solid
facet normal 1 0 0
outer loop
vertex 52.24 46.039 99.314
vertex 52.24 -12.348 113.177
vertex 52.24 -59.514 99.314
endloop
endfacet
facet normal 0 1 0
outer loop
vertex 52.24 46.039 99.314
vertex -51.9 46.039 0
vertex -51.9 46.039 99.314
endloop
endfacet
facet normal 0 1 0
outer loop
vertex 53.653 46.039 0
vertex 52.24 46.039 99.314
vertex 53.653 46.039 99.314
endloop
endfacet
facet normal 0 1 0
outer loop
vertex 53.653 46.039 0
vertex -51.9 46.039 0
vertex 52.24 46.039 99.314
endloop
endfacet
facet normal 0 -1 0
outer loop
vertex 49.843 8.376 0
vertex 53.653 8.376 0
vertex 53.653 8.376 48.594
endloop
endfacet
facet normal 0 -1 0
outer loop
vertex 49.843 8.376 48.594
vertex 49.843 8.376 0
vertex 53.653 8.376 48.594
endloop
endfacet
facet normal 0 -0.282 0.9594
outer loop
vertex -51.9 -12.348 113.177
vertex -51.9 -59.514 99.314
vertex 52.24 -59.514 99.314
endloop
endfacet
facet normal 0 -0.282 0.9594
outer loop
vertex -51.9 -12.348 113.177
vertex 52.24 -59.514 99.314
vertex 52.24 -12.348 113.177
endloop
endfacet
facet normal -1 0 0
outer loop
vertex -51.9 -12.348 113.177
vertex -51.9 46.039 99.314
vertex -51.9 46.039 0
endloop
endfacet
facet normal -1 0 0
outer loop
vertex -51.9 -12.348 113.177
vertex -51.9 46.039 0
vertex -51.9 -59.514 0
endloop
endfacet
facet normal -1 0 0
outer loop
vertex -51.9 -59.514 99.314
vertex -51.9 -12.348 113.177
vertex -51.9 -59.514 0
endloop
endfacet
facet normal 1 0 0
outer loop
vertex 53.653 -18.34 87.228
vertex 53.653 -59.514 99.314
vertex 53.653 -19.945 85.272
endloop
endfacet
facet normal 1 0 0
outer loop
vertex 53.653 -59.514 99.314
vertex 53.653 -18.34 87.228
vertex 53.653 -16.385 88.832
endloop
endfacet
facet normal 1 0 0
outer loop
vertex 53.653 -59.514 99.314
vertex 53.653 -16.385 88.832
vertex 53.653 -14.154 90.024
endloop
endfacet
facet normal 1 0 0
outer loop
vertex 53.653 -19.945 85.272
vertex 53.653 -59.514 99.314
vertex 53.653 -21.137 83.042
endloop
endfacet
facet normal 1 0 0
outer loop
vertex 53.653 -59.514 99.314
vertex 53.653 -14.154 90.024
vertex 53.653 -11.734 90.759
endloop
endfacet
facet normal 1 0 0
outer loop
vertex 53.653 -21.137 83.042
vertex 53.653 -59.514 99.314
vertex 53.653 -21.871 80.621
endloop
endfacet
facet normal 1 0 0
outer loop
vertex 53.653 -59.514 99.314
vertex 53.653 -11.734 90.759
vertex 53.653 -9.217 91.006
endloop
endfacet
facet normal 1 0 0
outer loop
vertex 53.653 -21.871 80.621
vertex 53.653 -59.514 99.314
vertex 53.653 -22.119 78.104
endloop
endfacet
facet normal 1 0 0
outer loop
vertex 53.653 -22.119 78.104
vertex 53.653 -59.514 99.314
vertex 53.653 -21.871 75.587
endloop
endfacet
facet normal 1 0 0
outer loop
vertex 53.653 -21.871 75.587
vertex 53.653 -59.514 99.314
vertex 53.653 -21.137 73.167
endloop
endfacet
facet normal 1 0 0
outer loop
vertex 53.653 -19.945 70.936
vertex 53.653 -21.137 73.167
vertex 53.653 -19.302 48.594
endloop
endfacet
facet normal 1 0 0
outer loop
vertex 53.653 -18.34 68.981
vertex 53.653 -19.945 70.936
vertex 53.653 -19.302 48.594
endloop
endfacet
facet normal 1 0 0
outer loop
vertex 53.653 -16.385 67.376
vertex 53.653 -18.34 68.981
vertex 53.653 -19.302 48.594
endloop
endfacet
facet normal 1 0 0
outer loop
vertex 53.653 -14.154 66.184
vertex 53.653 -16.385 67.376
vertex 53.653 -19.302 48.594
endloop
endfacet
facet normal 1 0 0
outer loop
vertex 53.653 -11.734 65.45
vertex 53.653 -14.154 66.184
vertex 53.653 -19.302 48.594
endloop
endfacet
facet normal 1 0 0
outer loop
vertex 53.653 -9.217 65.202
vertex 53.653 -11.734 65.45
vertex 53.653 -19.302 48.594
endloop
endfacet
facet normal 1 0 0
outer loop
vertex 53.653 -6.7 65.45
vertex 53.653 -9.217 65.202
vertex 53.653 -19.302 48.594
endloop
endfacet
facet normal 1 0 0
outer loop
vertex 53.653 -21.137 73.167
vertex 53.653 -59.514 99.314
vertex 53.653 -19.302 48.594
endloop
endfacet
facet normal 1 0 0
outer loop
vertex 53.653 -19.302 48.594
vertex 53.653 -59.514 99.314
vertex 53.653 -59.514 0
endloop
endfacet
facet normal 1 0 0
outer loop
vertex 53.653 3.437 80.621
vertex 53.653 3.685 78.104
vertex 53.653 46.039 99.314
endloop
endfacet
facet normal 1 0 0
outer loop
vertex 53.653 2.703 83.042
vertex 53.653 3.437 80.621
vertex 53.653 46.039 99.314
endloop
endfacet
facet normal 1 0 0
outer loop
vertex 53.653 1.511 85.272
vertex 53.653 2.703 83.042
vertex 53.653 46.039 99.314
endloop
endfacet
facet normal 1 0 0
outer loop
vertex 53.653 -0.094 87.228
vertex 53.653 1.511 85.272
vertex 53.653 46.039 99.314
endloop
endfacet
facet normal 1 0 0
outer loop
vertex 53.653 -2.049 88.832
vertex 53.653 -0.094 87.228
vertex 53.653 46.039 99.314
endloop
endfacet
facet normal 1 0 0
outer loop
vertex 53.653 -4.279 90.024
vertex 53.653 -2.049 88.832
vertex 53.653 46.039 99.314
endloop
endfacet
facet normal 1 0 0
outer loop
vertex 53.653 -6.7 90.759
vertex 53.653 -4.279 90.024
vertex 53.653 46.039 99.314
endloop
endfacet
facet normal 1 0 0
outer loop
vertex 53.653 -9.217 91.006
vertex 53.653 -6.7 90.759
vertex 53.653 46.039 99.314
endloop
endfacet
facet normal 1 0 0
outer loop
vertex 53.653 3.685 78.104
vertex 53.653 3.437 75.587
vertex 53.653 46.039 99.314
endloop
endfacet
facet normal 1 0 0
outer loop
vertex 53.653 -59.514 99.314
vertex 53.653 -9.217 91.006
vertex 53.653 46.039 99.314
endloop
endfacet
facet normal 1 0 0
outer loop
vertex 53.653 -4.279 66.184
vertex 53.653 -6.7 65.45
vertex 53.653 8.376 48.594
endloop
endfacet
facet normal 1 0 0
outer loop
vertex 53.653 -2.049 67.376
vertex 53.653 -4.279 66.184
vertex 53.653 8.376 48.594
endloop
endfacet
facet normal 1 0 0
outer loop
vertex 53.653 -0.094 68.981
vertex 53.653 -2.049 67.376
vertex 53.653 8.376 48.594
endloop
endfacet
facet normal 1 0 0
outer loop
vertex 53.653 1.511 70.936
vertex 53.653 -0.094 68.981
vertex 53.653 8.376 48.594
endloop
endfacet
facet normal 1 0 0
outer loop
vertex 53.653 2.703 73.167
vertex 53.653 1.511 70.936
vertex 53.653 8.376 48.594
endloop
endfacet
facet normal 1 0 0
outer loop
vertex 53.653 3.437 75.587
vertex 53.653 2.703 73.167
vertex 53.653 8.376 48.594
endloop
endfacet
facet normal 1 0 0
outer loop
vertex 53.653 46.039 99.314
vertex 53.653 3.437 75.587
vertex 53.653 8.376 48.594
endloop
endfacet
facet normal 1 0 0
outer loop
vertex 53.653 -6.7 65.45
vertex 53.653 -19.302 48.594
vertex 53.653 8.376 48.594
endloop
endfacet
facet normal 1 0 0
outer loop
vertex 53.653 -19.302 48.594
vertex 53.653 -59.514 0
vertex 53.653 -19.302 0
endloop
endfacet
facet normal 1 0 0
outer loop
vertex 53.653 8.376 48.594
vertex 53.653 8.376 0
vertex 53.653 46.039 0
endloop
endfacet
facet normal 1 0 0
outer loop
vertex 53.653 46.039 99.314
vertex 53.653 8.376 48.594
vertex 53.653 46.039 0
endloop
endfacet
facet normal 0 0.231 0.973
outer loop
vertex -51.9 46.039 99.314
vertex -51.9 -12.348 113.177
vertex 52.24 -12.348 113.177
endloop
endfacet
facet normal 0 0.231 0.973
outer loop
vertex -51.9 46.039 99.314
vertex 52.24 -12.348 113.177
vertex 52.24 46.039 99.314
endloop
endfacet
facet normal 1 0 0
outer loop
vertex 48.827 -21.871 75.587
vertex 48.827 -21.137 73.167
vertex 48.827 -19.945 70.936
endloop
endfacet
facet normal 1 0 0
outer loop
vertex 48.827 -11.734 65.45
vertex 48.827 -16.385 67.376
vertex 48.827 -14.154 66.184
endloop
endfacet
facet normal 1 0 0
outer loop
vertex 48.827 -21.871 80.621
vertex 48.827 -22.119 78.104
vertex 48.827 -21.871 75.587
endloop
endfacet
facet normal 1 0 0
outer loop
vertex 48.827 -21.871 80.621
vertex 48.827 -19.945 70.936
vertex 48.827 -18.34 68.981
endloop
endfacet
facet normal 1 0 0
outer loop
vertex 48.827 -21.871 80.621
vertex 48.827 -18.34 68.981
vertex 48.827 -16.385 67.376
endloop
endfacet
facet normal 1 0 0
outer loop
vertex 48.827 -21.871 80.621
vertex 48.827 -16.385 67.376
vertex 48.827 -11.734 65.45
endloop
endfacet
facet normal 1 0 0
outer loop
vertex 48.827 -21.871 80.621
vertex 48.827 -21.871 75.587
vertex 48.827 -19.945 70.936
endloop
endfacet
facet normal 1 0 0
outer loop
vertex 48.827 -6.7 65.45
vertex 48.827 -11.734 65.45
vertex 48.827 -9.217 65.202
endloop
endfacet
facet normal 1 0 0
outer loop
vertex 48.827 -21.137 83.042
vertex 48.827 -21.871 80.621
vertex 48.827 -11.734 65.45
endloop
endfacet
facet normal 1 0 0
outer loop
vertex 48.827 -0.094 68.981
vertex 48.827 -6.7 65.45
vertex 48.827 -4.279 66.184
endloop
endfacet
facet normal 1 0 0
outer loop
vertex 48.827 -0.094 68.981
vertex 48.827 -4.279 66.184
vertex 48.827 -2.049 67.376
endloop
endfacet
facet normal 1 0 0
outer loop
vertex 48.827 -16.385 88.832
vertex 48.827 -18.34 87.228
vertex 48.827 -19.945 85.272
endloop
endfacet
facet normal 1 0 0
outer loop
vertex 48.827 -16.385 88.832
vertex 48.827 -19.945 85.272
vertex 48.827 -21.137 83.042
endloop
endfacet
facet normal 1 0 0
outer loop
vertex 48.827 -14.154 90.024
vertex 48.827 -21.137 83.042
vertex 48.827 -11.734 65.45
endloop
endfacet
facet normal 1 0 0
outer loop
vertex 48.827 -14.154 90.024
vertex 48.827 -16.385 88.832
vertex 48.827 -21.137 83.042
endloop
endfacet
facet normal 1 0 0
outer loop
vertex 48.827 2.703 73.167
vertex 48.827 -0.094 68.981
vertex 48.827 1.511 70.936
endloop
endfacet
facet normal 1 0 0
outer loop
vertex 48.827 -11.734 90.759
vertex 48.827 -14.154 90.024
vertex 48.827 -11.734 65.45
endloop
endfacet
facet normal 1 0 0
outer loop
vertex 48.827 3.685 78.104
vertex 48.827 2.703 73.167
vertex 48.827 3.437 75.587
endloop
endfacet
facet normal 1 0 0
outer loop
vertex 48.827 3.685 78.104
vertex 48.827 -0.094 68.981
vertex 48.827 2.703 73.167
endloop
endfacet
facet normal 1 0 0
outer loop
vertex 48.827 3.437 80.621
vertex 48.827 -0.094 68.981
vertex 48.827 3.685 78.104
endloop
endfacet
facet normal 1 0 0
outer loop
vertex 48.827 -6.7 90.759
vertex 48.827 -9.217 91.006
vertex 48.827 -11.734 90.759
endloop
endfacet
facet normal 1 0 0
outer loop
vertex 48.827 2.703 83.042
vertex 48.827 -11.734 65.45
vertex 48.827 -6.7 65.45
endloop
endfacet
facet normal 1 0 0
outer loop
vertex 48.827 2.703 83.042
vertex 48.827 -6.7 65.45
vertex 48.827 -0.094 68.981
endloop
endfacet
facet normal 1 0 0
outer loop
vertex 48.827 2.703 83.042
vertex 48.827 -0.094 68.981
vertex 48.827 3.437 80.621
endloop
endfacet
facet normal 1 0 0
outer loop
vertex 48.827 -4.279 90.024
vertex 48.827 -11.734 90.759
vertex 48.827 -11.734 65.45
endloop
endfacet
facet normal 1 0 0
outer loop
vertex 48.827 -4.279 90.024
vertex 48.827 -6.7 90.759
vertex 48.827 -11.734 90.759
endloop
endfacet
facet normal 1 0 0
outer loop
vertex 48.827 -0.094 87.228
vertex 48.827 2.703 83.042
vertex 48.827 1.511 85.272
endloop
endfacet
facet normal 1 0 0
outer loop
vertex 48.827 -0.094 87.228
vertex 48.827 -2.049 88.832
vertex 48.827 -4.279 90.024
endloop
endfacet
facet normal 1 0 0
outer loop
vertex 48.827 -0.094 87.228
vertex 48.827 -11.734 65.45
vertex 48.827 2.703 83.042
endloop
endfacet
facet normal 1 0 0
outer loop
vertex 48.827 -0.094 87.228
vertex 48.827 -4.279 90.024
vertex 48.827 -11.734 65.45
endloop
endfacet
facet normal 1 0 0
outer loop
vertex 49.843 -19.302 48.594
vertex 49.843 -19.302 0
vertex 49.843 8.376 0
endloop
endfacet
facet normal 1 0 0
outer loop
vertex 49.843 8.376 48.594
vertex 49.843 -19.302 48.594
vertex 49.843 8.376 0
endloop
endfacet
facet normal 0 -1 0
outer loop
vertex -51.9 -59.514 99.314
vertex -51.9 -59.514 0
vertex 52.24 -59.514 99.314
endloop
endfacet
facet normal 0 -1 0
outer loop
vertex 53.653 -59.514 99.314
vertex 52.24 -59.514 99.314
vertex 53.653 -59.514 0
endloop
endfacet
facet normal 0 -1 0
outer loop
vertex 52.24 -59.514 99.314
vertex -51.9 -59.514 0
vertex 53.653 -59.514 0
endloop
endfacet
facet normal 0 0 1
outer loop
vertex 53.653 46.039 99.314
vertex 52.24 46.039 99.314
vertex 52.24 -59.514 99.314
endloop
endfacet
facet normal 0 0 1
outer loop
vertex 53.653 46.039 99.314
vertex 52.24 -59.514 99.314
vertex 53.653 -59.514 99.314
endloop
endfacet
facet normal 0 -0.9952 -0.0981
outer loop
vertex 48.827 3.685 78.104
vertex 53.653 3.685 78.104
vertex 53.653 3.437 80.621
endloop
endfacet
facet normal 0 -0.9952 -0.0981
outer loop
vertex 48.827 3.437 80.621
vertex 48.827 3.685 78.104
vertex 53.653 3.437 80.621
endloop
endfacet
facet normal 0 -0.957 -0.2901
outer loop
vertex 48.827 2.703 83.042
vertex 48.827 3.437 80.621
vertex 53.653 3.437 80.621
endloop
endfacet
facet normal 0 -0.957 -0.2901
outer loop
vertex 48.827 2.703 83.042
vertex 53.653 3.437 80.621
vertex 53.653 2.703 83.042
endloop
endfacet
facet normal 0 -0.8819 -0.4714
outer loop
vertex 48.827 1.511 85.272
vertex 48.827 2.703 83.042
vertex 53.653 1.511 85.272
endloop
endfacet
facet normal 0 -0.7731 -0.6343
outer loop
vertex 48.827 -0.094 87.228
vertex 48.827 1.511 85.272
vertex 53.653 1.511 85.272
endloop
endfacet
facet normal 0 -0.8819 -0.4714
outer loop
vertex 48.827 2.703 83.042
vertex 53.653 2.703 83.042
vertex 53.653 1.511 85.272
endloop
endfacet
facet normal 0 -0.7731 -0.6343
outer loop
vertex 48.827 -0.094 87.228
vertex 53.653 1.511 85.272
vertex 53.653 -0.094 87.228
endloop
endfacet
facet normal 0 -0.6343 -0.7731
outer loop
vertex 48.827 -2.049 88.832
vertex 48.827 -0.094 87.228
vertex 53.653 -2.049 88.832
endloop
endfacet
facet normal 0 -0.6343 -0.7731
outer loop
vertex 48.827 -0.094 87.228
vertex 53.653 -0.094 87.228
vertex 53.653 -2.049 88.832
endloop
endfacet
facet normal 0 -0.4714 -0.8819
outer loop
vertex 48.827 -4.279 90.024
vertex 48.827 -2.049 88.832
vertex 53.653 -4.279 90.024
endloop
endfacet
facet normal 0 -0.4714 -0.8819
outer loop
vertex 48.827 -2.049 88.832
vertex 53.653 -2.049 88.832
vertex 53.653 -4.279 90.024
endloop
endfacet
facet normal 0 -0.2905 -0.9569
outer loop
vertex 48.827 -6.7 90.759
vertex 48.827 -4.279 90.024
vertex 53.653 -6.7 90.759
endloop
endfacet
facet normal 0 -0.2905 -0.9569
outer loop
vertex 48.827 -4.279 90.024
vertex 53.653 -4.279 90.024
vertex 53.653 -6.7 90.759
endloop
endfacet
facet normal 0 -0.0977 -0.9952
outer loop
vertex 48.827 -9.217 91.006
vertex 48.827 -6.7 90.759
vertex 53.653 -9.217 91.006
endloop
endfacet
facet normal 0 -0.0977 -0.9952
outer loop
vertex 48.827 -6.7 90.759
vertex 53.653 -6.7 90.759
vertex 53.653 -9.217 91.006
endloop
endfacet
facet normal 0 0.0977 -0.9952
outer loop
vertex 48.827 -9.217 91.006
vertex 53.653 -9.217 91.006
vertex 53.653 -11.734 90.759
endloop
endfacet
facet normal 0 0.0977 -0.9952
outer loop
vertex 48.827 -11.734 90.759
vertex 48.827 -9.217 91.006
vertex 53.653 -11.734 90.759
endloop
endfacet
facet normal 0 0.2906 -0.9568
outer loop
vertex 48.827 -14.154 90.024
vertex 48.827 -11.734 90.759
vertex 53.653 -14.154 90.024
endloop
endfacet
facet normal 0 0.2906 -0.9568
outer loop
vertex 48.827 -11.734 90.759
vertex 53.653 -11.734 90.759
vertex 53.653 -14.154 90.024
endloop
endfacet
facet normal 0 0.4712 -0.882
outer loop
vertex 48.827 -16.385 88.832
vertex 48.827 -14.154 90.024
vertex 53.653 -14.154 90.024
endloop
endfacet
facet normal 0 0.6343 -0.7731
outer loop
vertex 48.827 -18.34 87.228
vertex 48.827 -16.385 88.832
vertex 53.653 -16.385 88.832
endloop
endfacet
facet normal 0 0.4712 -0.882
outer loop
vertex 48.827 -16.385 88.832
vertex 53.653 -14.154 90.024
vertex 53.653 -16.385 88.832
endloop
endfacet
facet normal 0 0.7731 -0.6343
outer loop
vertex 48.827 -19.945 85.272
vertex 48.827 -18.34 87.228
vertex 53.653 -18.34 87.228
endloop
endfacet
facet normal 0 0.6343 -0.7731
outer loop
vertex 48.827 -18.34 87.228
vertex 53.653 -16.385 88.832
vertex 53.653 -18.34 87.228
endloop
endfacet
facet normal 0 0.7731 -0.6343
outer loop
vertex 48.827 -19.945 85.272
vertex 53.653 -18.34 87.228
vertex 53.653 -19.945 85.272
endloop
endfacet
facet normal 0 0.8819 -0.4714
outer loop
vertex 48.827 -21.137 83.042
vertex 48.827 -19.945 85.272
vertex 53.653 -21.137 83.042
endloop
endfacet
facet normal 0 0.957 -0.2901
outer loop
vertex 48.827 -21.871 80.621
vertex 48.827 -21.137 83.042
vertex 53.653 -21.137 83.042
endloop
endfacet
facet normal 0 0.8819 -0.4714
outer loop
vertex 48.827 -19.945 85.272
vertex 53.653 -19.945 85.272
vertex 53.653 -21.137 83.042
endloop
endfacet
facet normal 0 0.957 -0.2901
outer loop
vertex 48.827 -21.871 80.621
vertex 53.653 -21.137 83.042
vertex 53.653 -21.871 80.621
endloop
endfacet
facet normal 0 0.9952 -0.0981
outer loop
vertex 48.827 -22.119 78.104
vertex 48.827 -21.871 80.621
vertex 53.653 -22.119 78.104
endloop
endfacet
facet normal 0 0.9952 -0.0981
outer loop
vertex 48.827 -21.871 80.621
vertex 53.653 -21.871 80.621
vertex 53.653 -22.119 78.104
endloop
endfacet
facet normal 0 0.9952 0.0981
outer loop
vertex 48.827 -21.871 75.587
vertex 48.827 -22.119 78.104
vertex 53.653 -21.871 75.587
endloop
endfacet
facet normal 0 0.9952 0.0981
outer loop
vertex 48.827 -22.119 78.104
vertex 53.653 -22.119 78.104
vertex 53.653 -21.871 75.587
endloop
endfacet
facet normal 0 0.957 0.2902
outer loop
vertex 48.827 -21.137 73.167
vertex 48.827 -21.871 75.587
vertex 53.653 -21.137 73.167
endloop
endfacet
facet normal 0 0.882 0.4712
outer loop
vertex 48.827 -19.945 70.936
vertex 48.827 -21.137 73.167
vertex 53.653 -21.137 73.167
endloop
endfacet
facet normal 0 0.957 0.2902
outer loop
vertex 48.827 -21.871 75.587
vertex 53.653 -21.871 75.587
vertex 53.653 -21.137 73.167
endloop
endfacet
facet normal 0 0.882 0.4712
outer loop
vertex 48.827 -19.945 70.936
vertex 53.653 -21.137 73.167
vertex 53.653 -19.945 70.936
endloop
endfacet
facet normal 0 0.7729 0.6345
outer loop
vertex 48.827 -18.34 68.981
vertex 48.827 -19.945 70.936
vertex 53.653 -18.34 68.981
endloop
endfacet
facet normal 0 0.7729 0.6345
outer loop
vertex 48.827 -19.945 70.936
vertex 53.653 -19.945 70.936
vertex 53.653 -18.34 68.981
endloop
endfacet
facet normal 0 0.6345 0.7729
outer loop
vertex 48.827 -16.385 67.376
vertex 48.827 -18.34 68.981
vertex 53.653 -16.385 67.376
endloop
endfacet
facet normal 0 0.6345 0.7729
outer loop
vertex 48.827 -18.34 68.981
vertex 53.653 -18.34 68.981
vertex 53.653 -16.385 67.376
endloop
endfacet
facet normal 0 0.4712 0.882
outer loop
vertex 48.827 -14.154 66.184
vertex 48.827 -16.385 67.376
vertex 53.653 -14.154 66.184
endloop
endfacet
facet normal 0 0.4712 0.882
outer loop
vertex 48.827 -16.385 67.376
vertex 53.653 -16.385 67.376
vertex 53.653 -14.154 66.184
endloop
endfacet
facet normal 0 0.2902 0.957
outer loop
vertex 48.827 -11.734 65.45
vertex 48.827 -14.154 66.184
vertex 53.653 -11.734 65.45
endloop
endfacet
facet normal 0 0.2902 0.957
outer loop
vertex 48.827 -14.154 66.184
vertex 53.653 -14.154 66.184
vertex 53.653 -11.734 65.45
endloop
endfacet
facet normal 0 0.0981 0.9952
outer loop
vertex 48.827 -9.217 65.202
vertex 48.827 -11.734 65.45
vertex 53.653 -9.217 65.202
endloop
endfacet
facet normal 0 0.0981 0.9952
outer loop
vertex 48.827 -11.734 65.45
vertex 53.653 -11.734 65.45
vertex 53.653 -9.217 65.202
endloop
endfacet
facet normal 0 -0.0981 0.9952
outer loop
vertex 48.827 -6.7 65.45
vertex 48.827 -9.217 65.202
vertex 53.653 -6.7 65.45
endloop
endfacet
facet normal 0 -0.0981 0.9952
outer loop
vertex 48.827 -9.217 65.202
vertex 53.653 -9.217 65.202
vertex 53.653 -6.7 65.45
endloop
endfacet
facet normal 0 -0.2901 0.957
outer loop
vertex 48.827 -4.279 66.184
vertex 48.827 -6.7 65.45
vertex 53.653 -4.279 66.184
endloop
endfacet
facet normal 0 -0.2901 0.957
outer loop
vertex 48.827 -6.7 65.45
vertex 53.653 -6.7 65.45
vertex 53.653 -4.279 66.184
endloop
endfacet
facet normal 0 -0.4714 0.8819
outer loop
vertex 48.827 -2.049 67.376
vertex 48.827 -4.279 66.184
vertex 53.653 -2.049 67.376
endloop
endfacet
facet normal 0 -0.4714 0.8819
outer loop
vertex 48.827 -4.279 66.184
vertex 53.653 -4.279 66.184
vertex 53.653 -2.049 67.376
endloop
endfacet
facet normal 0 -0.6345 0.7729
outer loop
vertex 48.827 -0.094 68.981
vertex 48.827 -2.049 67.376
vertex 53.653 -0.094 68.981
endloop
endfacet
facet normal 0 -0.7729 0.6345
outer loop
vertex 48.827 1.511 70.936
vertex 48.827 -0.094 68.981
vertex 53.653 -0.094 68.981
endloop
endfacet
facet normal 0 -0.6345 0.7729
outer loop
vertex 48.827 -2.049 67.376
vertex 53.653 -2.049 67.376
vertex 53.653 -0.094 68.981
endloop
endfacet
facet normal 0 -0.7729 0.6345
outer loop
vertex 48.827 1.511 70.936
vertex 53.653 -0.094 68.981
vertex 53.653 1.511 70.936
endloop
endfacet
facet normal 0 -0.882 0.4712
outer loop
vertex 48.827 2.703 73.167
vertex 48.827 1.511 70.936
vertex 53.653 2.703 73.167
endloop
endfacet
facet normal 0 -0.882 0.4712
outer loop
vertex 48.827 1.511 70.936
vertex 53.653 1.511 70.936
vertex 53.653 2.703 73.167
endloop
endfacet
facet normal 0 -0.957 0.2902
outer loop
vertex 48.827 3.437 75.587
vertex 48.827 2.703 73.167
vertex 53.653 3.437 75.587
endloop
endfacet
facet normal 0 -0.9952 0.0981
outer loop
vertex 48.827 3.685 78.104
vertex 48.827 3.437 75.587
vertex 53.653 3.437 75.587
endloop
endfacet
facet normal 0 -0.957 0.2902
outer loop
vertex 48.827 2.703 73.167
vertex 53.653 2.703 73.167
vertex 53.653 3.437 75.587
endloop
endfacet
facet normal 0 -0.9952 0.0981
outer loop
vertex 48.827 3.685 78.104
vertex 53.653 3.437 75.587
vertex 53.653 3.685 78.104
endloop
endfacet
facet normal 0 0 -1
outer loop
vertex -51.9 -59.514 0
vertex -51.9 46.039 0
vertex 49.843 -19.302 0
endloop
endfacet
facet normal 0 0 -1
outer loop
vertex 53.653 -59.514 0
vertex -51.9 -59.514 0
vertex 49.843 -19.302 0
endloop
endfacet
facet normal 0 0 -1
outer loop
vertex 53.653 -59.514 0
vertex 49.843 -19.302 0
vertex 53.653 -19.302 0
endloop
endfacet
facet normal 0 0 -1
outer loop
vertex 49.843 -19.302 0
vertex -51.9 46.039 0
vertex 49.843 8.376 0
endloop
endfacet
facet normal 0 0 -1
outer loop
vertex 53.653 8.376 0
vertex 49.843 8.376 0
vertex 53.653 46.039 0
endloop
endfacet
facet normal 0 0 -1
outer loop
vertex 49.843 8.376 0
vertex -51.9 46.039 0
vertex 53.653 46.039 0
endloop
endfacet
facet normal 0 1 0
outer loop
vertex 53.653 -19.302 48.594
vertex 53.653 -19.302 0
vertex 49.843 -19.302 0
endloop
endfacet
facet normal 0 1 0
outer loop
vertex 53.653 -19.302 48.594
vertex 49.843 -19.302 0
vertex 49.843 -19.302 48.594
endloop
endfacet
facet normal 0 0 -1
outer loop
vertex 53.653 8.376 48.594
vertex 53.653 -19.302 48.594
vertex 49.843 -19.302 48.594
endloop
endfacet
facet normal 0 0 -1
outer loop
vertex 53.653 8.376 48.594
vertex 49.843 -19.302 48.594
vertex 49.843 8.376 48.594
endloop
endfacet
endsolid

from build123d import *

# Parameters (mm, degrees)
F0_W     = 105.55254668
F0_H     = 105.5525541306
F1_DEPTH = 99.314
F3_DEPTH = 104.14
F4_W     = 27.6781544089
F4_H     = 48.5944971442
F5_DEPTH = 3.81
F6_R     = 12.9022285529
F7_DEPTH = 4.826


with BuildPart() as f1:
    # F0 (on Top) → F1 (new body)
    with BuildSketch(Plane.XY):
        with Locations((0.8764155209, -6.7373067141)):
            Rectangle(F0_W, F0_H)
    extrude(amount=F1_DEPTH)

    # F2 (on face) → F3 (join)
    with BuildSketch(Plane(origin=(-51.8998578191, 0, 0), x_dir=(0, -1, 0), z_dir=(-1, 0, 0))):
        Polygon((12.3477084562, 113.1768599153), (-46.0389703512, 99.314), (59.5135837793, 99.314), align=None)
    extrude(amount=-F3_DEPTH)

    # F4 (on face) → F5 (cut)
    with BuildSketch(Plane.YZ.offset(53.6526888609)):
        with Locations((-5.462795496, 24.2972485721)):
            Rectangle(F4_W, F4_H)
    extrude(amount=-F5_DEPTH, mode=Mode.SUBTRACT)

    # F6 (on face) → F7 (cut)
    with BuildSketch(Plane.YZ.offset(53.6526888609)):
        with Locations((-9.2169223353, 78.1042650342)):
            Circle(F6_R)
    extrude(amount=-F7_DEPTH, mode=Mode.SUBTRACT)


solid = f1.part
